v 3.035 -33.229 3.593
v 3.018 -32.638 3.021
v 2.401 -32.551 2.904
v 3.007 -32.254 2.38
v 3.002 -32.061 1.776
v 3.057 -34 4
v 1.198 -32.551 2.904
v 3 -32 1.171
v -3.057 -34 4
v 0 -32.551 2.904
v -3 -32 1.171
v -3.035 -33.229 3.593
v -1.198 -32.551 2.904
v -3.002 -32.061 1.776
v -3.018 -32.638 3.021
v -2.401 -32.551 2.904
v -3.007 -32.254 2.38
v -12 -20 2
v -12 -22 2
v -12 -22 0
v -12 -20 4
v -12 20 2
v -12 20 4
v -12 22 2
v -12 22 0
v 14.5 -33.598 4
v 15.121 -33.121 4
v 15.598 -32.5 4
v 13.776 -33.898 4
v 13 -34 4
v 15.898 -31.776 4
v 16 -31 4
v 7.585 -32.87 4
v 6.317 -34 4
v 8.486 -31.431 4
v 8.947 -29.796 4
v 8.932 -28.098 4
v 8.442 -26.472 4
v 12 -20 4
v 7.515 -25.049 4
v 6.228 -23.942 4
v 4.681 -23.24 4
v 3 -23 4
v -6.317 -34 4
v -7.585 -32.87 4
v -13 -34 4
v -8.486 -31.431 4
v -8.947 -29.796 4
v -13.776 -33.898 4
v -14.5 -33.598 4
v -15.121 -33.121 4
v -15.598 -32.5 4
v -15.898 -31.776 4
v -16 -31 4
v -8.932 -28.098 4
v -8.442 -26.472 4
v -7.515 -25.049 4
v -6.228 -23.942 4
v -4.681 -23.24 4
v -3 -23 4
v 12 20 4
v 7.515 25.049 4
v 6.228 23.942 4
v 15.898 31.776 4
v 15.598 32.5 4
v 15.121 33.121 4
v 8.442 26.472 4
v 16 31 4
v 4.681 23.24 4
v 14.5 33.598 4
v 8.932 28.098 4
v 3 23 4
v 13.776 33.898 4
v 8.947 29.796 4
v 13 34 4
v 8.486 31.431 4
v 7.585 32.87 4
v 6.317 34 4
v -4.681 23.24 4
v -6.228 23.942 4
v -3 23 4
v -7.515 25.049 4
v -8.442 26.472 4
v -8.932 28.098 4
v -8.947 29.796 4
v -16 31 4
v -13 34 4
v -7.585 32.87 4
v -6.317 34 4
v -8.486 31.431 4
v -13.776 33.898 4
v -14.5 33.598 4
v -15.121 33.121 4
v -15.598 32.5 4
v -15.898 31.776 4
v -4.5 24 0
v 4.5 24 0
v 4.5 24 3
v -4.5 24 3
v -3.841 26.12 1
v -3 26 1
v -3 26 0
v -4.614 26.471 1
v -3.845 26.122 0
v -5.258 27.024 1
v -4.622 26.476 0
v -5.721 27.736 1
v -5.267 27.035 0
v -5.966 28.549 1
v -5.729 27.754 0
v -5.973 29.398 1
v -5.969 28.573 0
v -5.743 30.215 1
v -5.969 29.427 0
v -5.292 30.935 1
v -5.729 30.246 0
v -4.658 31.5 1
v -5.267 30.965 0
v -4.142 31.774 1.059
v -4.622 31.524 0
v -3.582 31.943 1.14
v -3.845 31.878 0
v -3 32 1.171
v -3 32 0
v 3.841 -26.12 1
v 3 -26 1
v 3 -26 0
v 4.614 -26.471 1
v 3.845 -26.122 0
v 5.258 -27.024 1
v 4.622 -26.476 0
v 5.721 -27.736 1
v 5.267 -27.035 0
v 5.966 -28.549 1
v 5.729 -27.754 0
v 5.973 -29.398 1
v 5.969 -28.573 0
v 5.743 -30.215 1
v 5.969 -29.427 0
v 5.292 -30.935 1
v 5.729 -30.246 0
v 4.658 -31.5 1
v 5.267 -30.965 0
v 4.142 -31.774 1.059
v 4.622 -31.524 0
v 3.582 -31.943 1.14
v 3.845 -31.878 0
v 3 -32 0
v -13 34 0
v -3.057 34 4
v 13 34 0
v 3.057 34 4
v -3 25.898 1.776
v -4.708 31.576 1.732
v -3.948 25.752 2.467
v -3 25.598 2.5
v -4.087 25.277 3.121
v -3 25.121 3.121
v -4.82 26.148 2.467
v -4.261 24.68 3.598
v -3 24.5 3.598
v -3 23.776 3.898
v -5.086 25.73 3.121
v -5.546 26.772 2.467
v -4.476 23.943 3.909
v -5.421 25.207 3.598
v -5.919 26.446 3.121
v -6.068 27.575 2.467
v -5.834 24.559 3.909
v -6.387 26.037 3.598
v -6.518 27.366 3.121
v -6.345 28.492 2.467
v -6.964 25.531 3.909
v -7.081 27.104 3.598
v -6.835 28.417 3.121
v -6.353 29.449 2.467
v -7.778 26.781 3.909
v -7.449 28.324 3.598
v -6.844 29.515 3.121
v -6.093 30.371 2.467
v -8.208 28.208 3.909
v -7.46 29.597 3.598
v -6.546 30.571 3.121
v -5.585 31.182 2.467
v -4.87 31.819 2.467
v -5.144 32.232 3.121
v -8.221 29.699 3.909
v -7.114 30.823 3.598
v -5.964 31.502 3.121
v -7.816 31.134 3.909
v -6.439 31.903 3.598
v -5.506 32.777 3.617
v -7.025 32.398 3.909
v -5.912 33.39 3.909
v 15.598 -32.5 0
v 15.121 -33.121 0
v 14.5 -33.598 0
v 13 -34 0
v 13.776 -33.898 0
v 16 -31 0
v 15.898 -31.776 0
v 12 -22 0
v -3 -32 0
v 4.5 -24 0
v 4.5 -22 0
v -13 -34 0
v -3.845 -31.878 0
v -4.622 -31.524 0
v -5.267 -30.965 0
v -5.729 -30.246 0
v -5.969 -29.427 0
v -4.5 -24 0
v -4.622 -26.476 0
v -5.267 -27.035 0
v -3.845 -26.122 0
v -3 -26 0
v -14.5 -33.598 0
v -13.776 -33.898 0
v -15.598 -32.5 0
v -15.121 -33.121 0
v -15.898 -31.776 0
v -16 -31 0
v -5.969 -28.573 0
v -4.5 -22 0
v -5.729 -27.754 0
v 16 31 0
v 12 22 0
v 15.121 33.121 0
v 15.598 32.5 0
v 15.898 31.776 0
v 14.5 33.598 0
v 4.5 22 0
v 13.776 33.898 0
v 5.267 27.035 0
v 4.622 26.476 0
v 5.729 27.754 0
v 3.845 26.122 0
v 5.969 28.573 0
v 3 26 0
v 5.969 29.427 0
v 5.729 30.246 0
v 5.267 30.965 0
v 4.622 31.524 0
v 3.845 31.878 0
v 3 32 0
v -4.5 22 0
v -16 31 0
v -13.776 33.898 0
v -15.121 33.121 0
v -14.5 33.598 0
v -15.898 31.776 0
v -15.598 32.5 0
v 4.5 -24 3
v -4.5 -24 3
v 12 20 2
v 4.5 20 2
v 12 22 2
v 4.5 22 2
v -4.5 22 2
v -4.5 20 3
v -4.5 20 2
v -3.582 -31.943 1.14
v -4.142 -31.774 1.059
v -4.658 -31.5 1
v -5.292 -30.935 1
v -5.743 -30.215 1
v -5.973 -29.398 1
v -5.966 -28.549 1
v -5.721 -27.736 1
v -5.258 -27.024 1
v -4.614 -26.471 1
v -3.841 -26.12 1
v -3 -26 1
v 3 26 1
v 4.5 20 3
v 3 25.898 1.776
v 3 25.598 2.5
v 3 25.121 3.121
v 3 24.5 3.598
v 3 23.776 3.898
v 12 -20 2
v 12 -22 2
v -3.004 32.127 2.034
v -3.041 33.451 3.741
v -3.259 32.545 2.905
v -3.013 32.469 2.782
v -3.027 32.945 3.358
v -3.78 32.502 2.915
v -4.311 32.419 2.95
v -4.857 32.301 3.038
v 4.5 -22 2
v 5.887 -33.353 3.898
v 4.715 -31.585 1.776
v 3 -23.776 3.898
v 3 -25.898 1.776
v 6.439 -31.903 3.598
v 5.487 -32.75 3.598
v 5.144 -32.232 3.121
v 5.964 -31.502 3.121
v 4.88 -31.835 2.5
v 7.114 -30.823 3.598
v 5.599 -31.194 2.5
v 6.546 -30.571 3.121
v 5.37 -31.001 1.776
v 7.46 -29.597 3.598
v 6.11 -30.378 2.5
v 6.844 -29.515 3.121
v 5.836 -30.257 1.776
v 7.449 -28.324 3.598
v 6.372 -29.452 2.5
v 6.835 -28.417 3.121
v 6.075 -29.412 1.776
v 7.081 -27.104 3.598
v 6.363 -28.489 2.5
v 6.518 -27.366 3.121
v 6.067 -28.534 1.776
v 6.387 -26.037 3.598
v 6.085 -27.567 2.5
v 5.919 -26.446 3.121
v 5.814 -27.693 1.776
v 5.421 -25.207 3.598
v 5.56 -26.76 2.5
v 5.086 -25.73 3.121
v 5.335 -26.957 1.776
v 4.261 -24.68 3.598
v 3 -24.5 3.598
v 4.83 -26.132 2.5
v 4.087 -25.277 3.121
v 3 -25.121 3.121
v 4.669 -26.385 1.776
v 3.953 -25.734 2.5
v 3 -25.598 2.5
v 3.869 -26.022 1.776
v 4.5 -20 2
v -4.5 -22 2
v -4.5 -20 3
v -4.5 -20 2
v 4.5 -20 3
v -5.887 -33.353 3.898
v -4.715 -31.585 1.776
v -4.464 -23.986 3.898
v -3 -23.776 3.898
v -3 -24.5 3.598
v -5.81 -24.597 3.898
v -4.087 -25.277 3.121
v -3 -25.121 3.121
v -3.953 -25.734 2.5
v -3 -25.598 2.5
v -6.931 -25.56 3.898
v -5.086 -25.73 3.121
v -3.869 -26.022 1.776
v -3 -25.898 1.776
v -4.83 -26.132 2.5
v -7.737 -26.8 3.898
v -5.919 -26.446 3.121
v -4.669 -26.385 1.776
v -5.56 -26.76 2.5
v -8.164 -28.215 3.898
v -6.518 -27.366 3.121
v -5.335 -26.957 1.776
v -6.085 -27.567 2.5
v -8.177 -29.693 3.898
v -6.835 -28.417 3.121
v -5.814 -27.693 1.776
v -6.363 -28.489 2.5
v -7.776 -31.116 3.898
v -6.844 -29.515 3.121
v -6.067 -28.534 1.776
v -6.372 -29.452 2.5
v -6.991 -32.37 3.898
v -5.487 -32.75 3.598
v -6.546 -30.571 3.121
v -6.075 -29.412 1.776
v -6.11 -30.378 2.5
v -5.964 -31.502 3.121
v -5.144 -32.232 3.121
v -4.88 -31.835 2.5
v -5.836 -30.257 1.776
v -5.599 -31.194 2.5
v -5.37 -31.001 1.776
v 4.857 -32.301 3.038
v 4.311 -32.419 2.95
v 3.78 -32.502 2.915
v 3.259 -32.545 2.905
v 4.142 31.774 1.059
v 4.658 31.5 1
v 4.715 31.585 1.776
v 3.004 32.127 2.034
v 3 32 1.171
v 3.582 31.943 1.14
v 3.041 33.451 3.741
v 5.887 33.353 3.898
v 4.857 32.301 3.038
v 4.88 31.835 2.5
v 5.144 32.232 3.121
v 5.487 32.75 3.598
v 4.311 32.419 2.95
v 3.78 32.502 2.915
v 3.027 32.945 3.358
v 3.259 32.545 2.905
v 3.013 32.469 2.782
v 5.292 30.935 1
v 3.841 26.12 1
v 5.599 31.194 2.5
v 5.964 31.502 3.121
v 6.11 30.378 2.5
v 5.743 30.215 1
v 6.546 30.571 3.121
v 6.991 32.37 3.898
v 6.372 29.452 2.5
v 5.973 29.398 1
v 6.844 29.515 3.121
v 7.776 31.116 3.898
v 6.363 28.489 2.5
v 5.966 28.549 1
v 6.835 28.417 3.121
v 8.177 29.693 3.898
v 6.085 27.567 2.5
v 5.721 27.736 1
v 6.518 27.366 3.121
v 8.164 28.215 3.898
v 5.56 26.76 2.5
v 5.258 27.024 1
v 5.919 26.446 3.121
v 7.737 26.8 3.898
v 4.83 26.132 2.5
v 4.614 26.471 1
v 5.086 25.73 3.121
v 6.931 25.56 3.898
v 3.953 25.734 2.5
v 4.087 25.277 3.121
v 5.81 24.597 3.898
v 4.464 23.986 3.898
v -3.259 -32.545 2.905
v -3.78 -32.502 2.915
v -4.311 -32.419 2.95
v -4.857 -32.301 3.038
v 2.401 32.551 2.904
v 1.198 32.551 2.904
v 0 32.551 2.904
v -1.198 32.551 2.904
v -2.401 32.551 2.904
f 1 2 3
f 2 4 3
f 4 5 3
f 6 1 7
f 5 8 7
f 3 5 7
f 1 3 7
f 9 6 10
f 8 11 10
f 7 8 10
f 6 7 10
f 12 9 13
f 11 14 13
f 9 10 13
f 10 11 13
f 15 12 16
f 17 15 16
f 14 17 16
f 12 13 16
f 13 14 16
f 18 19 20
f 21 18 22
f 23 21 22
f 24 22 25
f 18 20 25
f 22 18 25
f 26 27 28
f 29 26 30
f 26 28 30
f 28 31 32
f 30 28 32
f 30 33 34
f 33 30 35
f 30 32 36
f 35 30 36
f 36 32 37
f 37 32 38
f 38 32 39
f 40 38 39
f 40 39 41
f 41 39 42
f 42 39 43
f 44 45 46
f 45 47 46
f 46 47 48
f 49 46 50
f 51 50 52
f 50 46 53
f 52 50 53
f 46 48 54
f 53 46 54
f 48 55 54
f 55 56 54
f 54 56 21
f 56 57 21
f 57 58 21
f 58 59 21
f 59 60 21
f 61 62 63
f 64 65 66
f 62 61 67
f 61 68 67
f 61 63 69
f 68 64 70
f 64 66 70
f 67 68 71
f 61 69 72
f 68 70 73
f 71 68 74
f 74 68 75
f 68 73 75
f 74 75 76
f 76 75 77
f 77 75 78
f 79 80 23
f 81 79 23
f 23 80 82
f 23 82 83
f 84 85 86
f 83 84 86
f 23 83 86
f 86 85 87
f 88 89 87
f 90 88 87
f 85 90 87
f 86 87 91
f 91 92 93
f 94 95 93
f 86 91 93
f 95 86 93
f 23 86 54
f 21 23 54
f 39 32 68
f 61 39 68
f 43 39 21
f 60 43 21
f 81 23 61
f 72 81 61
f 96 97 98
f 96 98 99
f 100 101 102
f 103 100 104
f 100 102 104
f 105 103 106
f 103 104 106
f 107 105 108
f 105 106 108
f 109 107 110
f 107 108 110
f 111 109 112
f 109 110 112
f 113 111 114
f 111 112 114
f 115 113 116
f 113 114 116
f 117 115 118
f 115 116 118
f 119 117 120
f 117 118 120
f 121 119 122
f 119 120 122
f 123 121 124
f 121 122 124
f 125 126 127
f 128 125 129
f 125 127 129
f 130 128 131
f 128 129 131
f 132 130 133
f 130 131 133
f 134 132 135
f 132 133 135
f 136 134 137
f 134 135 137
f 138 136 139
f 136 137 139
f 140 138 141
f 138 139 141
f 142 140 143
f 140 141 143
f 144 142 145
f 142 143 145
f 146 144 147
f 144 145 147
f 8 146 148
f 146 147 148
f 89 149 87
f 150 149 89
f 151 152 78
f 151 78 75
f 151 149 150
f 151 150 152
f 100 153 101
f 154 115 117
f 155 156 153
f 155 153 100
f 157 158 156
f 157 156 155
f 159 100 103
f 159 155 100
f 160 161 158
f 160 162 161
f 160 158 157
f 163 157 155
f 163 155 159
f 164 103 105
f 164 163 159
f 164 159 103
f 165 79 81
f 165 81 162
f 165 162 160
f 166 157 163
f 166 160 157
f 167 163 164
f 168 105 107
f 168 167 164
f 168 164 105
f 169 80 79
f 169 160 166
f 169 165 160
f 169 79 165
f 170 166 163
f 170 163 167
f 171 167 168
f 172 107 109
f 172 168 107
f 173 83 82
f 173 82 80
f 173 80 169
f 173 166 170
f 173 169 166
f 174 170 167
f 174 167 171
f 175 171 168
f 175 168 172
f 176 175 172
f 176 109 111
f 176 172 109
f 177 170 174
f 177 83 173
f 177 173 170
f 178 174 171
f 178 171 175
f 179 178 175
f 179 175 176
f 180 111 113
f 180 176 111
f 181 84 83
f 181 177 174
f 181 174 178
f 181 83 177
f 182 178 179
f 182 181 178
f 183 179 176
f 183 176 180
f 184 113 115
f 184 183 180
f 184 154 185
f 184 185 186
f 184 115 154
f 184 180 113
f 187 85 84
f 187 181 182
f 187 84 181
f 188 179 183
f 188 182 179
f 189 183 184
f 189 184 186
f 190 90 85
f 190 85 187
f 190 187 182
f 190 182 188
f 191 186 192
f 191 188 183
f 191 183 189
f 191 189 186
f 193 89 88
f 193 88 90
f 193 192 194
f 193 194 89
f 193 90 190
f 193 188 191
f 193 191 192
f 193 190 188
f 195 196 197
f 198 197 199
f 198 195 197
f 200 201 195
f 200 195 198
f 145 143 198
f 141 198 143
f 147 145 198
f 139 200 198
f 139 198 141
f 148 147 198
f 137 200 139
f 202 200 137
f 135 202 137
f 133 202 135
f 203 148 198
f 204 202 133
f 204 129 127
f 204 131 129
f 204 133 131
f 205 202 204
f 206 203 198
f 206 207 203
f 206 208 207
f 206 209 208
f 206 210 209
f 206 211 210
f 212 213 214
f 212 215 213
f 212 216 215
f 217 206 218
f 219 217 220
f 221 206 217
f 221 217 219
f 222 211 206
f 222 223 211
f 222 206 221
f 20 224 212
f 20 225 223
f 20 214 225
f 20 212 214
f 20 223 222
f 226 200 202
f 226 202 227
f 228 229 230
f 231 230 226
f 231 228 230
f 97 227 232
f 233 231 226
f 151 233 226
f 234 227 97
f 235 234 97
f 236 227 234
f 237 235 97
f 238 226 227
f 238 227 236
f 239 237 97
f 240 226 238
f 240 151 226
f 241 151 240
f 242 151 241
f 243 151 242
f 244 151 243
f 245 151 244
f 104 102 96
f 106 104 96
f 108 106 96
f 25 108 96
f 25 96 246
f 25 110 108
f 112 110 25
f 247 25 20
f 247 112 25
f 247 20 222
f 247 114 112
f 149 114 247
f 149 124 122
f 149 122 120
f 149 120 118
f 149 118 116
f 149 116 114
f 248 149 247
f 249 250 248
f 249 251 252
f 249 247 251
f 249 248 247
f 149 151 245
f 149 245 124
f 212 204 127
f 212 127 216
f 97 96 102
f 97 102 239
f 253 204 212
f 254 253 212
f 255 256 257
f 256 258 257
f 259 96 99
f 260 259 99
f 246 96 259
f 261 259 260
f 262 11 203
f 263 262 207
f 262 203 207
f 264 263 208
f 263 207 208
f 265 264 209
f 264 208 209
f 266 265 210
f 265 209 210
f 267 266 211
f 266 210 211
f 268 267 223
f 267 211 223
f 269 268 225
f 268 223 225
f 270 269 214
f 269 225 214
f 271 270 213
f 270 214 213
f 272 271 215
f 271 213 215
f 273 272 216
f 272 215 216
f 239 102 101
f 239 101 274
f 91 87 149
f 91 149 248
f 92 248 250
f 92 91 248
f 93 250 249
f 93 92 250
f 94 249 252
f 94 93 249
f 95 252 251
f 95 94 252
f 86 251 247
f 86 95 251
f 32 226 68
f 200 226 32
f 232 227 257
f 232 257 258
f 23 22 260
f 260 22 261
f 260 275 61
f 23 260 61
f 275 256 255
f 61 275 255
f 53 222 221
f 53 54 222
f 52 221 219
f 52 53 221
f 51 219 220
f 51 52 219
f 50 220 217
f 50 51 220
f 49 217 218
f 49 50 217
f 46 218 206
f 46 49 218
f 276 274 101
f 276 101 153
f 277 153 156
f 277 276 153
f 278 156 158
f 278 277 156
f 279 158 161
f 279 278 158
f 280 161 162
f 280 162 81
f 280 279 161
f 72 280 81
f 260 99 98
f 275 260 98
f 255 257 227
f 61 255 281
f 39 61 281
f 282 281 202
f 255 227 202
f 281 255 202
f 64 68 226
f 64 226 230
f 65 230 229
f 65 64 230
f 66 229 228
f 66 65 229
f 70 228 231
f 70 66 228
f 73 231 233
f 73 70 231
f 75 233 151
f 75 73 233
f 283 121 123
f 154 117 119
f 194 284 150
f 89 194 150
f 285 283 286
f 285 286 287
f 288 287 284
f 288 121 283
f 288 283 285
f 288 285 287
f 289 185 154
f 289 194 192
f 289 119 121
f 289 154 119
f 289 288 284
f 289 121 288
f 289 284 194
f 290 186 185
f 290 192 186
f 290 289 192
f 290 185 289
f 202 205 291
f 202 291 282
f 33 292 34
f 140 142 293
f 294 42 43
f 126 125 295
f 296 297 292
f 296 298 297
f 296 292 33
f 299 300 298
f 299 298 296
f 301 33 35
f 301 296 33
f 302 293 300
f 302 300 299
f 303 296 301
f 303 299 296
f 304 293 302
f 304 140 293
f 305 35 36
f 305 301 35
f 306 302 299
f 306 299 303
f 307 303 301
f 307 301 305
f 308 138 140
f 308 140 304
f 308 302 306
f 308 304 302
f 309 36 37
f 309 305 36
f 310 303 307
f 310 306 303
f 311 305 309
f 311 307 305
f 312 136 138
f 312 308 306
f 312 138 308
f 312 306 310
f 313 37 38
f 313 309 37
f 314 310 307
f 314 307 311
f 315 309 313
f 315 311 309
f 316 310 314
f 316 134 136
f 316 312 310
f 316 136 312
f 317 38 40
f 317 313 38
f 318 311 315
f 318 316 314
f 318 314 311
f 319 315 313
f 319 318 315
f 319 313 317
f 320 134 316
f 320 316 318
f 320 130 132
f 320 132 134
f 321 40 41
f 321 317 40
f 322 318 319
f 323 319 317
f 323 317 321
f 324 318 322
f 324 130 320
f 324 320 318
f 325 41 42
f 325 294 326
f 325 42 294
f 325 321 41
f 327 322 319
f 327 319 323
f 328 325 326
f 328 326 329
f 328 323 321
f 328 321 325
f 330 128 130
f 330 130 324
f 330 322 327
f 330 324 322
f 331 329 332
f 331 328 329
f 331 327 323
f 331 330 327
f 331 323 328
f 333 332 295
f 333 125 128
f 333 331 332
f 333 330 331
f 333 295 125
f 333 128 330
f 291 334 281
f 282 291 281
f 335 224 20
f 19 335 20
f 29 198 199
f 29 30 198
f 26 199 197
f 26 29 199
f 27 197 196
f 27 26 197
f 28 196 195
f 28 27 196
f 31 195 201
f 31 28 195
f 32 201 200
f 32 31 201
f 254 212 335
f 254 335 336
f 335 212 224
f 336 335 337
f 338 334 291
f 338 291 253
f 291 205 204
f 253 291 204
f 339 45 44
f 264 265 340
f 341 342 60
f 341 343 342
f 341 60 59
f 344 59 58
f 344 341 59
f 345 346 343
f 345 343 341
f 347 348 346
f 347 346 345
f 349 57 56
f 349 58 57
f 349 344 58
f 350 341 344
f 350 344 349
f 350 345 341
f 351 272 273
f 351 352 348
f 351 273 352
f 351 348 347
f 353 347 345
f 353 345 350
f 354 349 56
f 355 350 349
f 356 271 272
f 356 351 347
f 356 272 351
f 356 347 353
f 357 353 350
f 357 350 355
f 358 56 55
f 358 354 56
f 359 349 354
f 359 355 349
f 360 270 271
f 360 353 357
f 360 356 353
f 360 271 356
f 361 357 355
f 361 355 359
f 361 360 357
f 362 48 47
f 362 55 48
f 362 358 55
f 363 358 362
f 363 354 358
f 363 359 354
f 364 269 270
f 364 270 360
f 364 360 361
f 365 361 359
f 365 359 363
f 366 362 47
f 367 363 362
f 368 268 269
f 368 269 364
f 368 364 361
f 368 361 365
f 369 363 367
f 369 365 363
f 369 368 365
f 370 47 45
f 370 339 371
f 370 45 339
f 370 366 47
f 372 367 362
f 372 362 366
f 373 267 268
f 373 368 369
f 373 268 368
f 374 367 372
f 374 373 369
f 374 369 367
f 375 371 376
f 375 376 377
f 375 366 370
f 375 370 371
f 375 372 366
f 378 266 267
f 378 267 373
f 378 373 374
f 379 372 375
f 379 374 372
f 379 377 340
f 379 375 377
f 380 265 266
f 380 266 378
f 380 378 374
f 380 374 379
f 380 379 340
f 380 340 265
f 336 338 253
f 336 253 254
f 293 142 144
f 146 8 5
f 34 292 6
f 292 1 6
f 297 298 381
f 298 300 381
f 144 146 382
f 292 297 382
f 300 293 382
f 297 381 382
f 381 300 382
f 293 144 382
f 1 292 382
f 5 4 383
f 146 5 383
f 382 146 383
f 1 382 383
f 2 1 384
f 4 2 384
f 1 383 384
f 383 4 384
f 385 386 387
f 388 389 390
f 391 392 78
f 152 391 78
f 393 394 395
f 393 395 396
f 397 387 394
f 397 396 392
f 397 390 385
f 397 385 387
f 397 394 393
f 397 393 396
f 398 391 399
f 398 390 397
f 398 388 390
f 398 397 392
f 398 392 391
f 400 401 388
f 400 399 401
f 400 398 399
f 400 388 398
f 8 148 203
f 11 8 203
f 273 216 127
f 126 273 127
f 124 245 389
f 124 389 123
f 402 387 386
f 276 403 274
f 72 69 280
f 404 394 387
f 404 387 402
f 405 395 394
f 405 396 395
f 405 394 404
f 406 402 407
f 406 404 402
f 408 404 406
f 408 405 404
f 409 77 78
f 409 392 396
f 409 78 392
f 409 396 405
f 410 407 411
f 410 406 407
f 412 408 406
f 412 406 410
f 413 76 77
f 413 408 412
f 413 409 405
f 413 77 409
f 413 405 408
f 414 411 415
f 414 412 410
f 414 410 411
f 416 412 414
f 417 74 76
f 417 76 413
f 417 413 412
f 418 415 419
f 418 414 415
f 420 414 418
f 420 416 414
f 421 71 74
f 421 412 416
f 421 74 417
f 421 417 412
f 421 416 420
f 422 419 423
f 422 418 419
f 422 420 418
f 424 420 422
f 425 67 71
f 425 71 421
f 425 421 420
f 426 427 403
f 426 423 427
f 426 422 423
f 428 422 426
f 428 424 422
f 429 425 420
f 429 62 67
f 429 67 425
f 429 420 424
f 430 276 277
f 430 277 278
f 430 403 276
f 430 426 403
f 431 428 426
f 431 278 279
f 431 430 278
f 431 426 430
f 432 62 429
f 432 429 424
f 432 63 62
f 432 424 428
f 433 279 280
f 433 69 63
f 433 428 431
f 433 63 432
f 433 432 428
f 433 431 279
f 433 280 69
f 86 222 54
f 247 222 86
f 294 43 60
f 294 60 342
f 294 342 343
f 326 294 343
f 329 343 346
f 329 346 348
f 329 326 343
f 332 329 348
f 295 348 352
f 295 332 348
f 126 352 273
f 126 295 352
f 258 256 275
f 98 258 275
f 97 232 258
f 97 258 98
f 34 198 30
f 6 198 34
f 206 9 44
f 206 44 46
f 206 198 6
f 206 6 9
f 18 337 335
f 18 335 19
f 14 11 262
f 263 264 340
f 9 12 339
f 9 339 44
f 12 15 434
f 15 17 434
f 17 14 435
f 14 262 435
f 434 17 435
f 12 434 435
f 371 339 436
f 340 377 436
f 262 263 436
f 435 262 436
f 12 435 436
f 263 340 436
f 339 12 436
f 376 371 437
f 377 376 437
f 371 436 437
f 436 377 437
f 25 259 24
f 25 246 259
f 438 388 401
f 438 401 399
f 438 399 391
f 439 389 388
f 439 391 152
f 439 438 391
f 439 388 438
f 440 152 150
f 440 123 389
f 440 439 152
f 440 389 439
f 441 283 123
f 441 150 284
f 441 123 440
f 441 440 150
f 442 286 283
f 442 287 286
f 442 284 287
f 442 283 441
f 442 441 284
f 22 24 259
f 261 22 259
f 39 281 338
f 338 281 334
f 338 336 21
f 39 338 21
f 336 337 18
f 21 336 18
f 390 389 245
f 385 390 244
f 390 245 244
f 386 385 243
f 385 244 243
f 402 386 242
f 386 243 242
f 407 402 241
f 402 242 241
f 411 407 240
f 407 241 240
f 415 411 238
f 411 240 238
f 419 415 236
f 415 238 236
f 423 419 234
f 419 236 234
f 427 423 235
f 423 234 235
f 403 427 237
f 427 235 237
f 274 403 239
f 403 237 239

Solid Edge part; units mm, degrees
sketch "Sketch1" plane through (0, 0, 0) normal (0, 0, 1) x (1, 0, 0)
  line L0 (-3, -26) -> (3, -26)
  line L1 (3, -32) -> (-3, -32)
  arc A0 (-3, -32) -> (-3, -26) centre (-3, -29) cw
  arc A1 (3, -26) -> (3, -32) centre (3, -29) cw
  line L2 (-16, -34) -> (-16, 34)
  line L3 (-16, 34) -> (16, 34)
  line L4 (16, 34) -> (16, -34)
  line L5 (16, -34) -> (-16, -34)
  line L6 (12, -20) -> (-12, -20)
  line L7 (-12, -20) -> (-12, 20)
  line L8 (-12, 20) -> (12, 20)
  line L9 (12, 20) -> (12, -20)
  line L10 (3, 32) -> (-3, 32)
  arc A2 (-3, 32) -> (-3, 26) centre (-3, 29) ccw
  line L11 (-3, 26) -> (3, 26)
  arc A3 (3, 26) -> (3, 32) centre (3, 29) ccw
extrude "Protrusion1" add sketch "Sketch1" along normal blind 4
sketch "Sketch2" plane through (0, 0, 0) normal (0, 0, 1) x (1, 0, 0)
  line L0 (4.5, -24) -> (-4.5, -24)
  line L1 (-4.5, -24) -> (-4.5, -20)
  line L2 (-4.5, -20) -> (4.5, -20)
  line L3 (4.5, -20) -> (4.5, -24)
  line L4 (-4.5, 20) -> (4.5, 20)
  line L5 (4.5, 20) -> (4.5, 24)
  line L6 (4.5, 24) -> (-4.5, 24)
  line L7 (-4.5, 24) -> (-4.5, 20)
extrude "ExtrudedCutout_1" cut sketch "Sketch2" along normal blind 3
fillet "Round_1" radius 3 12 edges at (-16, -34, 2) (16, -34, 2) (16, 34, 2) (-16, 34, 2) (0, 26, 4) (6, 29, 4) (0, 32, 4) (-6, 29, 4) (0, -32, 4) (-6, -29, 4) (0, -26, 4) (6, -29, 4)
sketch "Sketch3" plane through (0, 0, 0) normal (0, 0, -1) x (-1, 0, 0)
  line L0 (-12, 22) -> (-4.5, 22)
  line L1 (-4.5, 22) -> (-4.5, 20)
  line L2 (-4.5, 20) -> (-12, 20)
  line L3 (-12, 20) -> (-12, 22)
  line L4 (4.5, 22) -> (12, 22)
  line L5 (12, 22) -> (12, 20)
  line L6 (12, 20) -> (4.5, 20)
  line L7 (4.5, 20) -> (4.5, 22)
  line L8 (-12, -20) -> (-4.5, -20)
  line L9 (-4.5, -20) -> (-4.5, -22)
  line L10 (-4.5, -22) -> (-12, -22)
  line L11 (-12, -22) -> (-12, -20)
  line L12 (12, -20) -> (4.5, -20)
  line L13 (4.5, -20) -> (4.5, -22)
  line L14 (4.5, -22) -> (12, -22)
  line L15 (12, -22) -> (12, -20)
extrude "ExtrudedCutout_2" cut sketch "Sketch3" against normal blind 2
